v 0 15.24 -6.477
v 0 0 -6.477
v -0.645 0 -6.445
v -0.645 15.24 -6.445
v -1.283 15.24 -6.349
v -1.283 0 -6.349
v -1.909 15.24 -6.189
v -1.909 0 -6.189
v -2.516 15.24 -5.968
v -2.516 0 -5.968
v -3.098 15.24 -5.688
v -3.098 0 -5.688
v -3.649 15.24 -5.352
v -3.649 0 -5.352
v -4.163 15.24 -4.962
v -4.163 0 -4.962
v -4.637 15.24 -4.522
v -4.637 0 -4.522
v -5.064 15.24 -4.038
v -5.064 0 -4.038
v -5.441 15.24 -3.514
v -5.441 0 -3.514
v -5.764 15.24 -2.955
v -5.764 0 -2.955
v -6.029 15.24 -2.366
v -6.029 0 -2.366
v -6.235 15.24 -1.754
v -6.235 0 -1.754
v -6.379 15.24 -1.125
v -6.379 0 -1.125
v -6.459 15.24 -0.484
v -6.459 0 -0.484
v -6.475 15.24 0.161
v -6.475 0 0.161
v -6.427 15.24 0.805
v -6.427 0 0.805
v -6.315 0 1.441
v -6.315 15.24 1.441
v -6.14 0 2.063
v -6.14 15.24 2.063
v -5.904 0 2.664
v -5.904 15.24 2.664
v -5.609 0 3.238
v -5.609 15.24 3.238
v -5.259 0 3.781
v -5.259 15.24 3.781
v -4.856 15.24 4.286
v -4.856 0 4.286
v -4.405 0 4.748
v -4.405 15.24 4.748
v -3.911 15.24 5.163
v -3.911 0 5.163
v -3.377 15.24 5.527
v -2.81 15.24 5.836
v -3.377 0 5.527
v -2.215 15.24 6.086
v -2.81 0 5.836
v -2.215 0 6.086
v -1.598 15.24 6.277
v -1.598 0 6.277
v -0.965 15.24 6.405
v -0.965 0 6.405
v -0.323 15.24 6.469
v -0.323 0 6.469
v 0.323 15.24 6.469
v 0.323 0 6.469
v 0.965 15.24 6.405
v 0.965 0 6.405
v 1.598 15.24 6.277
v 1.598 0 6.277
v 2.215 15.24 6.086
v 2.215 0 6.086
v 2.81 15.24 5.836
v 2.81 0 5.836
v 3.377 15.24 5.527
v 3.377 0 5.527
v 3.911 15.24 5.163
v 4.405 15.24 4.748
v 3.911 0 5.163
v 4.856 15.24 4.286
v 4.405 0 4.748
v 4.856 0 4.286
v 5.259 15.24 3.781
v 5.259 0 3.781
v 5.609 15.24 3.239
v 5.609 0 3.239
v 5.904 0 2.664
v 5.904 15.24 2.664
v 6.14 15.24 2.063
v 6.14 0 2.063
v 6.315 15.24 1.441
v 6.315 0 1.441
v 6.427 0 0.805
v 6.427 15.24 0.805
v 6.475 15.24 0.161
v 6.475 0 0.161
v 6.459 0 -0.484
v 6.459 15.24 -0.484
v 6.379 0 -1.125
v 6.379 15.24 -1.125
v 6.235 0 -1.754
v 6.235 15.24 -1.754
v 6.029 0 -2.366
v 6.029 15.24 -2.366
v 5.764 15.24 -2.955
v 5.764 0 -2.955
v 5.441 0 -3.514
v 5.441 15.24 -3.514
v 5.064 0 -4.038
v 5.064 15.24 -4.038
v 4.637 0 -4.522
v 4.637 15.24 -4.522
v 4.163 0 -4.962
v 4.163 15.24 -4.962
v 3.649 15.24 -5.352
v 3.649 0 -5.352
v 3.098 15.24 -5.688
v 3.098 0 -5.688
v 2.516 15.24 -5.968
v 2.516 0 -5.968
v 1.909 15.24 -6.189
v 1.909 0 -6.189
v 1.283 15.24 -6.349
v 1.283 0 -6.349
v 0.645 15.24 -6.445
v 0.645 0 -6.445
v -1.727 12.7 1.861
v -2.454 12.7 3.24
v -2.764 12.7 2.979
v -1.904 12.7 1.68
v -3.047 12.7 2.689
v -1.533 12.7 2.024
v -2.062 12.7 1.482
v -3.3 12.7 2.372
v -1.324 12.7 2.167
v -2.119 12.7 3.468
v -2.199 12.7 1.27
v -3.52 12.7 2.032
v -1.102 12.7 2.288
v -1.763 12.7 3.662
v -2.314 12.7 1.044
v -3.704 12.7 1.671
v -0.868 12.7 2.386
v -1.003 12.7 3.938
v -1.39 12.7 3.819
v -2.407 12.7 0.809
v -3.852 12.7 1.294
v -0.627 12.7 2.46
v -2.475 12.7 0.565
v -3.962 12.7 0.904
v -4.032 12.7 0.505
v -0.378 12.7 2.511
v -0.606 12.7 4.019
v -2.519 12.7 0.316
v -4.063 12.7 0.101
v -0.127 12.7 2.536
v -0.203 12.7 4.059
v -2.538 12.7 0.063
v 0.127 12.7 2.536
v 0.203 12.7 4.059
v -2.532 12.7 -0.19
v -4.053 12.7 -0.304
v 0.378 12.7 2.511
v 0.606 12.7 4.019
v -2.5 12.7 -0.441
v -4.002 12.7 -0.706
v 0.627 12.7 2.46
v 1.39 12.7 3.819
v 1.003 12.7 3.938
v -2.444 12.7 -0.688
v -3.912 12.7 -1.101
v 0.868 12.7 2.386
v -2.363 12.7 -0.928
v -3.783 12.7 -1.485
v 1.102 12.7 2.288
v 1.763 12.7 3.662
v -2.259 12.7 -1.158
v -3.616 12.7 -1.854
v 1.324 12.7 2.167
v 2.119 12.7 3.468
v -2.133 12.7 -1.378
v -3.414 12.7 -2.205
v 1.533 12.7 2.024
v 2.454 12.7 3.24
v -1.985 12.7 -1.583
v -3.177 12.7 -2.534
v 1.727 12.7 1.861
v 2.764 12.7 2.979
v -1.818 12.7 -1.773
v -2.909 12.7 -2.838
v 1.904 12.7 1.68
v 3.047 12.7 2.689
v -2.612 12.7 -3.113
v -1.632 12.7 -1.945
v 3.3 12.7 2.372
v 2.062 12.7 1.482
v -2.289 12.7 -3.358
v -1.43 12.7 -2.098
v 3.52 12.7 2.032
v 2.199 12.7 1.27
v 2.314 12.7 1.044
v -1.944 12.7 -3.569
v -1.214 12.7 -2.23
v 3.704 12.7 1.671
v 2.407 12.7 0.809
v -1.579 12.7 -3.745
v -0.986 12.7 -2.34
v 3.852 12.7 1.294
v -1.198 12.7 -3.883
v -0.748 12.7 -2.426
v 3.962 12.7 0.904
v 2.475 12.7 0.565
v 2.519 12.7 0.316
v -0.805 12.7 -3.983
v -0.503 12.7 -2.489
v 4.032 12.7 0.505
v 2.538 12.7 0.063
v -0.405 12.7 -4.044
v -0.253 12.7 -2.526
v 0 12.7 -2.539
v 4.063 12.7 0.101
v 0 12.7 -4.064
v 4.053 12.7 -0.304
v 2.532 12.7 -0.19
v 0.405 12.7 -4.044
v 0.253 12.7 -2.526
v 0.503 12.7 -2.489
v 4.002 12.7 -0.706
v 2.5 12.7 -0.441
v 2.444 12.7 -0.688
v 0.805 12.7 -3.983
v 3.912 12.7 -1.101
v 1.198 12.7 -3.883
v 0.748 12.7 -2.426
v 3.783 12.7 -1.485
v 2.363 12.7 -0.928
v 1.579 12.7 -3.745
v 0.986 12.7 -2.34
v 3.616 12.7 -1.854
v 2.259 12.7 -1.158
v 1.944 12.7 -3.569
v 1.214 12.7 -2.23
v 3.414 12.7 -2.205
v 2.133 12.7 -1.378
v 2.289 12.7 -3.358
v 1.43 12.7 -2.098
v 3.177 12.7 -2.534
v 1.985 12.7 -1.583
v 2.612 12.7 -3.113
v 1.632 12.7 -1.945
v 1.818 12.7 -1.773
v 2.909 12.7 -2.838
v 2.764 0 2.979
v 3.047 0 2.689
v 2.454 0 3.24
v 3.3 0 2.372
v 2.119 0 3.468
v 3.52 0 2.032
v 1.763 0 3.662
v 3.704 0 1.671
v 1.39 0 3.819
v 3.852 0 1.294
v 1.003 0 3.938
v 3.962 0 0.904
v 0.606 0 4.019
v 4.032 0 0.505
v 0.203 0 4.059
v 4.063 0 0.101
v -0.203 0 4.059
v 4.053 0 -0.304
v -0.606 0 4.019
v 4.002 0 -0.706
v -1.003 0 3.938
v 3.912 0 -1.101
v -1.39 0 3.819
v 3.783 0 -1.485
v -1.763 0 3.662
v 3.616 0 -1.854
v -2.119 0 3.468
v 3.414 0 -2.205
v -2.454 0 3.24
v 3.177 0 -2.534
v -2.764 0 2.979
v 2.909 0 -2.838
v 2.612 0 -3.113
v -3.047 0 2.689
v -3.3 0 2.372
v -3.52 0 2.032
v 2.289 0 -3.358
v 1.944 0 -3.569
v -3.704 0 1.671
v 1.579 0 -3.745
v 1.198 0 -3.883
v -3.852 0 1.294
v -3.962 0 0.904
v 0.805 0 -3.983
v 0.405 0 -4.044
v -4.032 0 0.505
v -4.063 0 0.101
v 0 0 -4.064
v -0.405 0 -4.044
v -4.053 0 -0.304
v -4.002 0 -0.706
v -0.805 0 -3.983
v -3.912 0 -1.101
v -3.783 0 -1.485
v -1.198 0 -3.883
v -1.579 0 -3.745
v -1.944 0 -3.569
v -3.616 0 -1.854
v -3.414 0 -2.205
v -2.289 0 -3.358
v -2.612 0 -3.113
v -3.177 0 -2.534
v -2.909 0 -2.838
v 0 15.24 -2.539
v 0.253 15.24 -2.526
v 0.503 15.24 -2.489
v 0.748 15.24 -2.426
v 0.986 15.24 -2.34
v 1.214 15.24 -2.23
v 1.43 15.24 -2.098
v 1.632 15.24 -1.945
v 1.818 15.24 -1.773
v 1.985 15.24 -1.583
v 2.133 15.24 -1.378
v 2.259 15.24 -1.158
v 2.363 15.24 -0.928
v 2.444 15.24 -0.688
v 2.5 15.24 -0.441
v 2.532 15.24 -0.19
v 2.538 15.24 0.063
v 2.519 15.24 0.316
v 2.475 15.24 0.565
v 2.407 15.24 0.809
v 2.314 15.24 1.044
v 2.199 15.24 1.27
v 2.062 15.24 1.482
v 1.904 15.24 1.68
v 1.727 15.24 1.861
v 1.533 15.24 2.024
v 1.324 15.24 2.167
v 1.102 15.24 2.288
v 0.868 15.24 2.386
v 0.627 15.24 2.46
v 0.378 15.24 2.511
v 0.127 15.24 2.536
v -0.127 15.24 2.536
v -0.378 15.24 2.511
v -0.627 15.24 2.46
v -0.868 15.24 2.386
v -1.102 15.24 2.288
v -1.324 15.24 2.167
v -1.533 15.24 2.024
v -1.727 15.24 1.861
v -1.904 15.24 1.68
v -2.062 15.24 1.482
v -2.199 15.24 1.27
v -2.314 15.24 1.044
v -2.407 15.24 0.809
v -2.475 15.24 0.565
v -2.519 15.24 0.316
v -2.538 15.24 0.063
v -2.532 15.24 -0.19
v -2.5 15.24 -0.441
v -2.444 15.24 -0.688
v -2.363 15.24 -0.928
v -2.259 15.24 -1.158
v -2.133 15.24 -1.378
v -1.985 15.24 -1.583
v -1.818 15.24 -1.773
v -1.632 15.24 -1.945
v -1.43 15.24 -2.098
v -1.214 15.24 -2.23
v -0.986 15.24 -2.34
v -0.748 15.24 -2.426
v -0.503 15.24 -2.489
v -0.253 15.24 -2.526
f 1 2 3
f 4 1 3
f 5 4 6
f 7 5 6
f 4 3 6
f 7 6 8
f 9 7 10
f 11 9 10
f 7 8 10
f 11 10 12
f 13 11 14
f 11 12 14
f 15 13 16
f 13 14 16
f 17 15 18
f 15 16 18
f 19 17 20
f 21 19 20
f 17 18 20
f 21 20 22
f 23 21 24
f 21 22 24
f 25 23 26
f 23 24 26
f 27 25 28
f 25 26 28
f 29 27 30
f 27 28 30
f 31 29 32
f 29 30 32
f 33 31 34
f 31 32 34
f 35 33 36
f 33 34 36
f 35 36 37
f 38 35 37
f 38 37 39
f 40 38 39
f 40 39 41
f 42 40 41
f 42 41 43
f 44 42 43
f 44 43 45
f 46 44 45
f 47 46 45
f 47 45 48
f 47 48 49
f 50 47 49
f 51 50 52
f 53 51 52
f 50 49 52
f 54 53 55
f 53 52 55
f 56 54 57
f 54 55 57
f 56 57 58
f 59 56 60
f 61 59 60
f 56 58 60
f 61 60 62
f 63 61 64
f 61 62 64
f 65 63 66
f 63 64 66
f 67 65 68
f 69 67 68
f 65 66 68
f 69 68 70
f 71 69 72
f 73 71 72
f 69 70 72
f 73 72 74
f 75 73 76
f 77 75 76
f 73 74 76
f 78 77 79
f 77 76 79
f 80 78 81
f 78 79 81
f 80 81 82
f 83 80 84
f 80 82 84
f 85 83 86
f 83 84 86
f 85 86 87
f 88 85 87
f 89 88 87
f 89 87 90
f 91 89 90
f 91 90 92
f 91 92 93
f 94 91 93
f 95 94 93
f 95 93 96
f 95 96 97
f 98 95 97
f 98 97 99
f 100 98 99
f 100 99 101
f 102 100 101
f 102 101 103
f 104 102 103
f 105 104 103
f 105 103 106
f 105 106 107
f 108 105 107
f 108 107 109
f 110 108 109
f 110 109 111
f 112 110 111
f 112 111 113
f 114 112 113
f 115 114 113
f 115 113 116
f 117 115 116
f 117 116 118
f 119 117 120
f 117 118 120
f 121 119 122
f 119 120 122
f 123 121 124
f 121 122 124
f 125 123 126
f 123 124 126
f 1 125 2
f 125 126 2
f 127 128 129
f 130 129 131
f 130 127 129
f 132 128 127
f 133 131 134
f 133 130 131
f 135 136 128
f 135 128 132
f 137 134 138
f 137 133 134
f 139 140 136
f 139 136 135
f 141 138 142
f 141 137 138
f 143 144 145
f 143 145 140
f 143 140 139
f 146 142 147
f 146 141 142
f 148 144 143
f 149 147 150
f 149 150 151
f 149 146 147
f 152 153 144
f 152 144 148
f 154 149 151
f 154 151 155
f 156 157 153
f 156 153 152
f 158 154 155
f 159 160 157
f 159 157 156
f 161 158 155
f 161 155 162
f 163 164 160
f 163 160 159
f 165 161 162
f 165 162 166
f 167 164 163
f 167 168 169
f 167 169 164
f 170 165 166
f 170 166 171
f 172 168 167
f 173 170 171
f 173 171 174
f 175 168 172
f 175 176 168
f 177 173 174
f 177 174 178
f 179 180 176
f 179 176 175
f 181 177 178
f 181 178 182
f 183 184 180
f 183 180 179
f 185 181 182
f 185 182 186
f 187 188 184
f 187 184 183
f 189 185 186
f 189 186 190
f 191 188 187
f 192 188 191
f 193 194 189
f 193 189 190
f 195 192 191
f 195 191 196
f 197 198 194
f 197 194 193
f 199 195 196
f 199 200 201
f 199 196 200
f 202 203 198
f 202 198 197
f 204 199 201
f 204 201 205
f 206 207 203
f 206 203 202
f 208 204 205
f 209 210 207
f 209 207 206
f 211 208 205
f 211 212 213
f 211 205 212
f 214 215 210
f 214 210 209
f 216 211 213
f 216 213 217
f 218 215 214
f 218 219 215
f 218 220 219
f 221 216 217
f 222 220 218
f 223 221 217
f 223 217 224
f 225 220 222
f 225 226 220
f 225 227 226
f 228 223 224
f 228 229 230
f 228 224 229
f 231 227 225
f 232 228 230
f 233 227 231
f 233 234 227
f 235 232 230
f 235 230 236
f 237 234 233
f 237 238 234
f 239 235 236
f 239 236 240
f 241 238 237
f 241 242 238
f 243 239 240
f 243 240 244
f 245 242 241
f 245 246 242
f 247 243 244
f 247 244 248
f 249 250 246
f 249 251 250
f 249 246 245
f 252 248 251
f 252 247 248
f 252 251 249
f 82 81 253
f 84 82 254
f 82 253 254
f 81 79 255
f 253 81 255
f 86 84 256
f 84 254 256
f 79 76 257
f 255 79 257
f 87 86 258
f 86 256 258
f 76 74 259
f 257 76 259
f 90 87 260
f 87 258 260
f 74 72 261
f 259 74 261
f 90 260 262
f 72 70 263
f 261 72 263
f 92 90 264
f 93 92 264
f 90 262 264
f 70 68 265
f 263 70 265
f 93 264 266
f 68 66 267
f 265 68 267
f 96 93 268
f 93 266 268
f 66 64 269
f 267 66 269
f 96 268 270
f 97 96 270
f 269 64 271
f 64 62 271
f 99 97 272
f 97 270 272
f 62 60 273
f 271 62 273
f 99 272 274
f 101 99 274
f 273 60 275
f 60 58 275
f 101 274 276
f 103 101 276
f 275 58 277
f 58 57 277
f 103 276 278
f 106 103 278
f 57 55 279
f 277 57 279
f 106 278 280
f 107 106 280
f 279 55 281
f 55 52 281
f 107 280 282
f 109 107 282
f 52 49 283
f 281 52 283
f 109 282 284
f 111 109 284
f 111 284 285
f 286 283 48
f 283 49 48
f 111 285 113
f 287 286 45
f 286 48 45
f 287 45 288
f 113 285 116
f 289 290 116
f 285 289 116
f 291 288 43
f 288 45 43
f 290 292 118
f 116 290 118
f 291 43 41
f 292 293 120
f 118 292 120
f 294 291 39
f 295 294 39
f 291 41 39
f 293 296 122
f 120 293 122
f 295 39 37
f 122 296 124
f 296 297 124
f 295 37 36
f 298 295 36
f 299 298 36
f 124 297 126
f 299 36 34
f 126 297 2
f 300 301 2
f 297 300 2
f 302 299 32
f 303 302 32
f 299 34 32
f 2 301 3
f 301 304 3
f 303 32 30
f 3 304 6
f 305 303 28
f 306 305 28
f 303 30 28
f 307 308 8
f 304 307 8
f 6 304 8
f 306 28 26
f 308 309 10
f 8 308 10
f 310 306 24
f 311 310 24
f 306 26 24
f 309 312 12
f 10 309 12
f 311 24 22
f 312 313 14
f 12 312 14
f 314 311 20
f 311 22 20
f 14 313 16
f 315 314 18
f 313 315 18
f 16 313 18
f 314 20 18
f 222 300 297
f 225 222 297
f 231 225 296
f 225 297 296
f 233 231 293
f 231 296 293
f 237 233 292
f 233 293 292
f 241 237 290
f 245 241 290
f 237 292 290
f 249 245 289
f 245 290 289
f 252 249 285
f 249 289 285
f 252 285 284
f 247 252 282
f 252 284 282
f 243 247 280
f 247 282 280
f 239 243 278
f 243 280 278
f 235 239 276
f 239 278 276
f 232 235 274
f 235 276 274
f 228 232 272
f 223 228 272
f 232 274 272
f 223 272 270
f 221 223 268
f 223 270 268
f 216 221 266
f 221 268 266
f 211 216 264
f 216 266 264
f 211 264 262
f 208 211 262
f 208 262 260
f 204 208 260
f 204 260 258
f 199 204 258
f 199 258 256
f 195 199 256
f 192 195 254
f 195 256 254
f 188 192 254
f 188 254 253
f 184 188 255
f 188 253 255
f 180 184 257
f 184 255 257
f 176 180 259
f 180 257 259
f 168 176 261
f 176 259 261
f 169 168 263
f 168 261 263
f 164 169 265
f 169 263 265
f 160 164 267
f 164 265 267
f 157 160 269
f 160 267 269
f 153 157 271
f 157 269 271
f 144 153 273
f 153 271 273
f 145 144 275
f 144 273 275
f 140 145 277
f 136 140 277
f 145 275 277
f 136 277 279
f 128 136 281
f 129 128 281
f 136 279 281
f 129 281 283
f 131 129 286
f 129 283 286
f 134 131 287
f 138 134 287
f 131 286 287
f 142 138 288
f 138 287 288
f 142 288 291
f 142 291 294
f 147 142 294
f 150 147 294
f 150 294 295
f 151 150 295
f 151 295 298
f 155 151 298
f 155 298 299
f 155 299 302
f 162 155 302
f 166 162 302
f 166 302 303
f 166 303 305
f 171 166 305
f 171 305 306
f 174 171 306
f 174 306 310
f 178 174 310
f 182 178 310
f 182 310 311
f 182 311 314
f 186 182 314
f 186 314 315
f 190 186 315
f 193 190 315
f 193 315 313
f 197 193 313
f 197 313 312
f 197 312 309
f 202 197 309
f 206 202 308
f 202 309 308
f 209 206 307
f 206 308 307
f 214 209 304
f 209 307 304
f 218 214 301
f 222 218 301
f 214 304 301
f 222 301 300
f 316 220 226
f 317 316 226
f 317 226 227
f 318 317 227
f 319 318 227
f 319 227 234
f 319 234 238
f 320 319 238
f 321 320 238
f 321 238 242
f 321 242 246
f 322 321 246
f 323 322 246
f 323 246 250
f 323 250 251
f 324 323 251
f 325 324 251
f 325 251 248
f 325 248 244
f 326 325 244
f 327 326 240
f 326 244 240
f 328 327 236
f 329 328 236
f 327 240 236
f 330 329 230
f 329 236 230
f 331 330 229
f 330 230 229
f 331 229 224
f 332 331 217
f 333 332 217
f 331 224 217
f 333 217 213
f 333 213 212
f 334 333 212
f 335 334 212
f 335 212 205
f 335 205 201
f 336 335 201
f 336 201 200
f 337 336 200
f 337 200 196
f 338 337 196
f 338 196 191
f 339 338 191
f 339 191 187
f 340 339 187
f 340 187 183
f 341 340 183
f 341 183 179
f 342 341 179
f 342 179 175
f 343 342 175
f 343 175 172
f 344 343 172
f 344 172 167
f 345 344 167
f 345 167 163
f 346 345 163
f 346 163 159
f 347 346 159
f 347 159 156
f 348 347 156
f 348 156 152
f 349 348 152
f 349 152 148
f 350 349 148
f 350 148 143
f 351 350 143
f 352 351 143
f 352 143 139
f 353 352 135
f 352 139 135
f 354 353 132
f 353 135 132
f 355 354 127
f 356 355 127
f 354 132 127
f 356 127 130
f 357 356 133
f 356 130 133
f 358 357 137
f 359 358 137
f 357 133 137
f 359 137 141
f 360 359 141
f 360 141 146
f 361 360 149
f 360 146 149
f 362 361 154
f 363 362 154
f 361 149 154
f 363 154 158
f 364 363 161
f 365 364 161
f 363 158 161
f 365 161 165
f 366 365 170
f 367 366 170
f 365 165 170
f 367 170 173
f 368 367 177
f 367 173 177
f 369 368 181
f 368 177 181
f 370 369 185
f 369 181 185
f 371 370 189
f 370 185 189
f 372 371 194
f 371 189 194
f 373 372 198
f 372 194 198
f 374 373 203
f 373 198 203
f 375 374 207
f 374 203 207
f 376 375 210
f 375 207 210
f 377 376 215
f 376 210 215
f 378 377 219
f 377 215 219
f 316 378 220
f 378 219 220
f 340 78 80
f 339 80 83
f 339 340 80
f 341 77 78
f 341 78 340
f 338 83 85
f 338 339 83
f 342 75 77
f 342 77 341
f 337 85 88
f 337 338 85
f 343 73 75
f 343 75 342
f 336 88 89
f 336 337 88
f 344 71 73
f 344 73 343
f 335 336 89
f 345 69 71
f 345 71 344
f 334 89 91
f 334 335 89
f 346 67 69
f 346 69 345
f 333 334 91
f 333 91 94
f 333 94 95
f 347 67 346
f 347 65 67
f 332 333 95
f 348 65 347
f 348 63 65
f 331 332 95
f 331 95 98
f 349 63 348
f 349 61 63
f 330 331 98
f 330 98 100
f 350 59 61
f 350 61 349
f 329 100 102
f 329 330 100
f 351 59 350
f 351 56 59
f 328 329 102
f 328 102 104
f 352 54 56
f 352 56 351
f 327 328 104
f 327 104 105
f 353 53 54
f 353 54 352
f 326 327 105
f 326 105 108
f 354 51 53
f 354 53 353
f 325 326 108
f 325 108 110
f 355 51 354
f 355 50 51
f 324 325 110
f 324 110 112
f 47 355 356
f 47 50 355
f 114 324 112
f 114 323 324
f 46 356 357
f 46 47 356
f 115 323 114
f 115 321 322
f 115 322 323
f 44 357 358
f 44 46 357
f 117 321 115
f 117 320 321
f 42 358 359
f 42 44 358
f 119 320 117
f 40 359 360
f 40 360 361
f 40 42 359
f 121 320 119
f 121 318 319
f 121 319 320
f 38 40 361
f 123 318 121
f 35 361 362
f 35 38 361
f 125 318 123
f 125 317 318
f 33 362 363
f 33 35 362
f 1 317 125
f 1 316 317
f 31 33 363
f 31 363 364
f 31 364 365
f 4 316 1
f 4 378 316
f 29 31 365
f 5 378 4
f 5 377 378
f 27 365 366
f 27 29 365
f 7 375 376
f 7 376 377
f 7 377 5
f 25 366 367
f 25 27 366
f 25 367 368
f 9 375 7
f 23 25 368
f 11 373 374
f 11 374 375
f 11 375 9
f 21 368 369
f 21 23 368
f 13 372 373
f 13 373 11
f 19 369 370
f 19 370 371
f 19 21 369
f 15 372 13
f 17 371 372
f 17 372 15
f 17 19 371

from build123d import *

# Parameters (mm, degrees)
SKETCH1_R           = 6.477
BOSS_EXTRUDE3_DEPTH = 15.24
SKETCH4_R           = 4.064
CUT_EXTRUDE2_DEPTH  = 12.7
SKETCH5_R           = 2.539011159
CUT_EXTRUDE3_DEPTH  = 12.7


with BuildPart() as part:
    # Sketch1 → Boss-Extrude3 (new body)
    with BuildSketch(Plane(origin=(0, 0, 0), x_dir=(1, 0, 0), z_dir=(0, 1, 0))):
        with Locations(Location((0, 0, 0), (0, 0, 90))):
            Circle(SKETCH1_R)
    extrude(amount=BOSS_EXTRUDE3_DEPTH)

    # Sketch4 → Cut-Extrude2 (cut)
    with BuildSketch(Plane.XZ):
        with Locations(Location((0, 0, 0), (0, 0, 270))):
            Circle(SKETCH4_R)
    extrude(amount=-CUT_EXTRUDE2_DEPTH, mode=Mode.SUBTRACT)

    # Sketch5 → Cut-Extrude3 (cut)
    with BuildSketch(Plane.XZ.offset(-12.7)):
        with Locations(Location((0, 0, 0), (0, 0, 270))):
            Circle(SKETCH5_R)
    extrude(amount=-CUT_EXTRUDE3_DEPTH, mode=Mode.SUBTRACT)


solid = part.part
